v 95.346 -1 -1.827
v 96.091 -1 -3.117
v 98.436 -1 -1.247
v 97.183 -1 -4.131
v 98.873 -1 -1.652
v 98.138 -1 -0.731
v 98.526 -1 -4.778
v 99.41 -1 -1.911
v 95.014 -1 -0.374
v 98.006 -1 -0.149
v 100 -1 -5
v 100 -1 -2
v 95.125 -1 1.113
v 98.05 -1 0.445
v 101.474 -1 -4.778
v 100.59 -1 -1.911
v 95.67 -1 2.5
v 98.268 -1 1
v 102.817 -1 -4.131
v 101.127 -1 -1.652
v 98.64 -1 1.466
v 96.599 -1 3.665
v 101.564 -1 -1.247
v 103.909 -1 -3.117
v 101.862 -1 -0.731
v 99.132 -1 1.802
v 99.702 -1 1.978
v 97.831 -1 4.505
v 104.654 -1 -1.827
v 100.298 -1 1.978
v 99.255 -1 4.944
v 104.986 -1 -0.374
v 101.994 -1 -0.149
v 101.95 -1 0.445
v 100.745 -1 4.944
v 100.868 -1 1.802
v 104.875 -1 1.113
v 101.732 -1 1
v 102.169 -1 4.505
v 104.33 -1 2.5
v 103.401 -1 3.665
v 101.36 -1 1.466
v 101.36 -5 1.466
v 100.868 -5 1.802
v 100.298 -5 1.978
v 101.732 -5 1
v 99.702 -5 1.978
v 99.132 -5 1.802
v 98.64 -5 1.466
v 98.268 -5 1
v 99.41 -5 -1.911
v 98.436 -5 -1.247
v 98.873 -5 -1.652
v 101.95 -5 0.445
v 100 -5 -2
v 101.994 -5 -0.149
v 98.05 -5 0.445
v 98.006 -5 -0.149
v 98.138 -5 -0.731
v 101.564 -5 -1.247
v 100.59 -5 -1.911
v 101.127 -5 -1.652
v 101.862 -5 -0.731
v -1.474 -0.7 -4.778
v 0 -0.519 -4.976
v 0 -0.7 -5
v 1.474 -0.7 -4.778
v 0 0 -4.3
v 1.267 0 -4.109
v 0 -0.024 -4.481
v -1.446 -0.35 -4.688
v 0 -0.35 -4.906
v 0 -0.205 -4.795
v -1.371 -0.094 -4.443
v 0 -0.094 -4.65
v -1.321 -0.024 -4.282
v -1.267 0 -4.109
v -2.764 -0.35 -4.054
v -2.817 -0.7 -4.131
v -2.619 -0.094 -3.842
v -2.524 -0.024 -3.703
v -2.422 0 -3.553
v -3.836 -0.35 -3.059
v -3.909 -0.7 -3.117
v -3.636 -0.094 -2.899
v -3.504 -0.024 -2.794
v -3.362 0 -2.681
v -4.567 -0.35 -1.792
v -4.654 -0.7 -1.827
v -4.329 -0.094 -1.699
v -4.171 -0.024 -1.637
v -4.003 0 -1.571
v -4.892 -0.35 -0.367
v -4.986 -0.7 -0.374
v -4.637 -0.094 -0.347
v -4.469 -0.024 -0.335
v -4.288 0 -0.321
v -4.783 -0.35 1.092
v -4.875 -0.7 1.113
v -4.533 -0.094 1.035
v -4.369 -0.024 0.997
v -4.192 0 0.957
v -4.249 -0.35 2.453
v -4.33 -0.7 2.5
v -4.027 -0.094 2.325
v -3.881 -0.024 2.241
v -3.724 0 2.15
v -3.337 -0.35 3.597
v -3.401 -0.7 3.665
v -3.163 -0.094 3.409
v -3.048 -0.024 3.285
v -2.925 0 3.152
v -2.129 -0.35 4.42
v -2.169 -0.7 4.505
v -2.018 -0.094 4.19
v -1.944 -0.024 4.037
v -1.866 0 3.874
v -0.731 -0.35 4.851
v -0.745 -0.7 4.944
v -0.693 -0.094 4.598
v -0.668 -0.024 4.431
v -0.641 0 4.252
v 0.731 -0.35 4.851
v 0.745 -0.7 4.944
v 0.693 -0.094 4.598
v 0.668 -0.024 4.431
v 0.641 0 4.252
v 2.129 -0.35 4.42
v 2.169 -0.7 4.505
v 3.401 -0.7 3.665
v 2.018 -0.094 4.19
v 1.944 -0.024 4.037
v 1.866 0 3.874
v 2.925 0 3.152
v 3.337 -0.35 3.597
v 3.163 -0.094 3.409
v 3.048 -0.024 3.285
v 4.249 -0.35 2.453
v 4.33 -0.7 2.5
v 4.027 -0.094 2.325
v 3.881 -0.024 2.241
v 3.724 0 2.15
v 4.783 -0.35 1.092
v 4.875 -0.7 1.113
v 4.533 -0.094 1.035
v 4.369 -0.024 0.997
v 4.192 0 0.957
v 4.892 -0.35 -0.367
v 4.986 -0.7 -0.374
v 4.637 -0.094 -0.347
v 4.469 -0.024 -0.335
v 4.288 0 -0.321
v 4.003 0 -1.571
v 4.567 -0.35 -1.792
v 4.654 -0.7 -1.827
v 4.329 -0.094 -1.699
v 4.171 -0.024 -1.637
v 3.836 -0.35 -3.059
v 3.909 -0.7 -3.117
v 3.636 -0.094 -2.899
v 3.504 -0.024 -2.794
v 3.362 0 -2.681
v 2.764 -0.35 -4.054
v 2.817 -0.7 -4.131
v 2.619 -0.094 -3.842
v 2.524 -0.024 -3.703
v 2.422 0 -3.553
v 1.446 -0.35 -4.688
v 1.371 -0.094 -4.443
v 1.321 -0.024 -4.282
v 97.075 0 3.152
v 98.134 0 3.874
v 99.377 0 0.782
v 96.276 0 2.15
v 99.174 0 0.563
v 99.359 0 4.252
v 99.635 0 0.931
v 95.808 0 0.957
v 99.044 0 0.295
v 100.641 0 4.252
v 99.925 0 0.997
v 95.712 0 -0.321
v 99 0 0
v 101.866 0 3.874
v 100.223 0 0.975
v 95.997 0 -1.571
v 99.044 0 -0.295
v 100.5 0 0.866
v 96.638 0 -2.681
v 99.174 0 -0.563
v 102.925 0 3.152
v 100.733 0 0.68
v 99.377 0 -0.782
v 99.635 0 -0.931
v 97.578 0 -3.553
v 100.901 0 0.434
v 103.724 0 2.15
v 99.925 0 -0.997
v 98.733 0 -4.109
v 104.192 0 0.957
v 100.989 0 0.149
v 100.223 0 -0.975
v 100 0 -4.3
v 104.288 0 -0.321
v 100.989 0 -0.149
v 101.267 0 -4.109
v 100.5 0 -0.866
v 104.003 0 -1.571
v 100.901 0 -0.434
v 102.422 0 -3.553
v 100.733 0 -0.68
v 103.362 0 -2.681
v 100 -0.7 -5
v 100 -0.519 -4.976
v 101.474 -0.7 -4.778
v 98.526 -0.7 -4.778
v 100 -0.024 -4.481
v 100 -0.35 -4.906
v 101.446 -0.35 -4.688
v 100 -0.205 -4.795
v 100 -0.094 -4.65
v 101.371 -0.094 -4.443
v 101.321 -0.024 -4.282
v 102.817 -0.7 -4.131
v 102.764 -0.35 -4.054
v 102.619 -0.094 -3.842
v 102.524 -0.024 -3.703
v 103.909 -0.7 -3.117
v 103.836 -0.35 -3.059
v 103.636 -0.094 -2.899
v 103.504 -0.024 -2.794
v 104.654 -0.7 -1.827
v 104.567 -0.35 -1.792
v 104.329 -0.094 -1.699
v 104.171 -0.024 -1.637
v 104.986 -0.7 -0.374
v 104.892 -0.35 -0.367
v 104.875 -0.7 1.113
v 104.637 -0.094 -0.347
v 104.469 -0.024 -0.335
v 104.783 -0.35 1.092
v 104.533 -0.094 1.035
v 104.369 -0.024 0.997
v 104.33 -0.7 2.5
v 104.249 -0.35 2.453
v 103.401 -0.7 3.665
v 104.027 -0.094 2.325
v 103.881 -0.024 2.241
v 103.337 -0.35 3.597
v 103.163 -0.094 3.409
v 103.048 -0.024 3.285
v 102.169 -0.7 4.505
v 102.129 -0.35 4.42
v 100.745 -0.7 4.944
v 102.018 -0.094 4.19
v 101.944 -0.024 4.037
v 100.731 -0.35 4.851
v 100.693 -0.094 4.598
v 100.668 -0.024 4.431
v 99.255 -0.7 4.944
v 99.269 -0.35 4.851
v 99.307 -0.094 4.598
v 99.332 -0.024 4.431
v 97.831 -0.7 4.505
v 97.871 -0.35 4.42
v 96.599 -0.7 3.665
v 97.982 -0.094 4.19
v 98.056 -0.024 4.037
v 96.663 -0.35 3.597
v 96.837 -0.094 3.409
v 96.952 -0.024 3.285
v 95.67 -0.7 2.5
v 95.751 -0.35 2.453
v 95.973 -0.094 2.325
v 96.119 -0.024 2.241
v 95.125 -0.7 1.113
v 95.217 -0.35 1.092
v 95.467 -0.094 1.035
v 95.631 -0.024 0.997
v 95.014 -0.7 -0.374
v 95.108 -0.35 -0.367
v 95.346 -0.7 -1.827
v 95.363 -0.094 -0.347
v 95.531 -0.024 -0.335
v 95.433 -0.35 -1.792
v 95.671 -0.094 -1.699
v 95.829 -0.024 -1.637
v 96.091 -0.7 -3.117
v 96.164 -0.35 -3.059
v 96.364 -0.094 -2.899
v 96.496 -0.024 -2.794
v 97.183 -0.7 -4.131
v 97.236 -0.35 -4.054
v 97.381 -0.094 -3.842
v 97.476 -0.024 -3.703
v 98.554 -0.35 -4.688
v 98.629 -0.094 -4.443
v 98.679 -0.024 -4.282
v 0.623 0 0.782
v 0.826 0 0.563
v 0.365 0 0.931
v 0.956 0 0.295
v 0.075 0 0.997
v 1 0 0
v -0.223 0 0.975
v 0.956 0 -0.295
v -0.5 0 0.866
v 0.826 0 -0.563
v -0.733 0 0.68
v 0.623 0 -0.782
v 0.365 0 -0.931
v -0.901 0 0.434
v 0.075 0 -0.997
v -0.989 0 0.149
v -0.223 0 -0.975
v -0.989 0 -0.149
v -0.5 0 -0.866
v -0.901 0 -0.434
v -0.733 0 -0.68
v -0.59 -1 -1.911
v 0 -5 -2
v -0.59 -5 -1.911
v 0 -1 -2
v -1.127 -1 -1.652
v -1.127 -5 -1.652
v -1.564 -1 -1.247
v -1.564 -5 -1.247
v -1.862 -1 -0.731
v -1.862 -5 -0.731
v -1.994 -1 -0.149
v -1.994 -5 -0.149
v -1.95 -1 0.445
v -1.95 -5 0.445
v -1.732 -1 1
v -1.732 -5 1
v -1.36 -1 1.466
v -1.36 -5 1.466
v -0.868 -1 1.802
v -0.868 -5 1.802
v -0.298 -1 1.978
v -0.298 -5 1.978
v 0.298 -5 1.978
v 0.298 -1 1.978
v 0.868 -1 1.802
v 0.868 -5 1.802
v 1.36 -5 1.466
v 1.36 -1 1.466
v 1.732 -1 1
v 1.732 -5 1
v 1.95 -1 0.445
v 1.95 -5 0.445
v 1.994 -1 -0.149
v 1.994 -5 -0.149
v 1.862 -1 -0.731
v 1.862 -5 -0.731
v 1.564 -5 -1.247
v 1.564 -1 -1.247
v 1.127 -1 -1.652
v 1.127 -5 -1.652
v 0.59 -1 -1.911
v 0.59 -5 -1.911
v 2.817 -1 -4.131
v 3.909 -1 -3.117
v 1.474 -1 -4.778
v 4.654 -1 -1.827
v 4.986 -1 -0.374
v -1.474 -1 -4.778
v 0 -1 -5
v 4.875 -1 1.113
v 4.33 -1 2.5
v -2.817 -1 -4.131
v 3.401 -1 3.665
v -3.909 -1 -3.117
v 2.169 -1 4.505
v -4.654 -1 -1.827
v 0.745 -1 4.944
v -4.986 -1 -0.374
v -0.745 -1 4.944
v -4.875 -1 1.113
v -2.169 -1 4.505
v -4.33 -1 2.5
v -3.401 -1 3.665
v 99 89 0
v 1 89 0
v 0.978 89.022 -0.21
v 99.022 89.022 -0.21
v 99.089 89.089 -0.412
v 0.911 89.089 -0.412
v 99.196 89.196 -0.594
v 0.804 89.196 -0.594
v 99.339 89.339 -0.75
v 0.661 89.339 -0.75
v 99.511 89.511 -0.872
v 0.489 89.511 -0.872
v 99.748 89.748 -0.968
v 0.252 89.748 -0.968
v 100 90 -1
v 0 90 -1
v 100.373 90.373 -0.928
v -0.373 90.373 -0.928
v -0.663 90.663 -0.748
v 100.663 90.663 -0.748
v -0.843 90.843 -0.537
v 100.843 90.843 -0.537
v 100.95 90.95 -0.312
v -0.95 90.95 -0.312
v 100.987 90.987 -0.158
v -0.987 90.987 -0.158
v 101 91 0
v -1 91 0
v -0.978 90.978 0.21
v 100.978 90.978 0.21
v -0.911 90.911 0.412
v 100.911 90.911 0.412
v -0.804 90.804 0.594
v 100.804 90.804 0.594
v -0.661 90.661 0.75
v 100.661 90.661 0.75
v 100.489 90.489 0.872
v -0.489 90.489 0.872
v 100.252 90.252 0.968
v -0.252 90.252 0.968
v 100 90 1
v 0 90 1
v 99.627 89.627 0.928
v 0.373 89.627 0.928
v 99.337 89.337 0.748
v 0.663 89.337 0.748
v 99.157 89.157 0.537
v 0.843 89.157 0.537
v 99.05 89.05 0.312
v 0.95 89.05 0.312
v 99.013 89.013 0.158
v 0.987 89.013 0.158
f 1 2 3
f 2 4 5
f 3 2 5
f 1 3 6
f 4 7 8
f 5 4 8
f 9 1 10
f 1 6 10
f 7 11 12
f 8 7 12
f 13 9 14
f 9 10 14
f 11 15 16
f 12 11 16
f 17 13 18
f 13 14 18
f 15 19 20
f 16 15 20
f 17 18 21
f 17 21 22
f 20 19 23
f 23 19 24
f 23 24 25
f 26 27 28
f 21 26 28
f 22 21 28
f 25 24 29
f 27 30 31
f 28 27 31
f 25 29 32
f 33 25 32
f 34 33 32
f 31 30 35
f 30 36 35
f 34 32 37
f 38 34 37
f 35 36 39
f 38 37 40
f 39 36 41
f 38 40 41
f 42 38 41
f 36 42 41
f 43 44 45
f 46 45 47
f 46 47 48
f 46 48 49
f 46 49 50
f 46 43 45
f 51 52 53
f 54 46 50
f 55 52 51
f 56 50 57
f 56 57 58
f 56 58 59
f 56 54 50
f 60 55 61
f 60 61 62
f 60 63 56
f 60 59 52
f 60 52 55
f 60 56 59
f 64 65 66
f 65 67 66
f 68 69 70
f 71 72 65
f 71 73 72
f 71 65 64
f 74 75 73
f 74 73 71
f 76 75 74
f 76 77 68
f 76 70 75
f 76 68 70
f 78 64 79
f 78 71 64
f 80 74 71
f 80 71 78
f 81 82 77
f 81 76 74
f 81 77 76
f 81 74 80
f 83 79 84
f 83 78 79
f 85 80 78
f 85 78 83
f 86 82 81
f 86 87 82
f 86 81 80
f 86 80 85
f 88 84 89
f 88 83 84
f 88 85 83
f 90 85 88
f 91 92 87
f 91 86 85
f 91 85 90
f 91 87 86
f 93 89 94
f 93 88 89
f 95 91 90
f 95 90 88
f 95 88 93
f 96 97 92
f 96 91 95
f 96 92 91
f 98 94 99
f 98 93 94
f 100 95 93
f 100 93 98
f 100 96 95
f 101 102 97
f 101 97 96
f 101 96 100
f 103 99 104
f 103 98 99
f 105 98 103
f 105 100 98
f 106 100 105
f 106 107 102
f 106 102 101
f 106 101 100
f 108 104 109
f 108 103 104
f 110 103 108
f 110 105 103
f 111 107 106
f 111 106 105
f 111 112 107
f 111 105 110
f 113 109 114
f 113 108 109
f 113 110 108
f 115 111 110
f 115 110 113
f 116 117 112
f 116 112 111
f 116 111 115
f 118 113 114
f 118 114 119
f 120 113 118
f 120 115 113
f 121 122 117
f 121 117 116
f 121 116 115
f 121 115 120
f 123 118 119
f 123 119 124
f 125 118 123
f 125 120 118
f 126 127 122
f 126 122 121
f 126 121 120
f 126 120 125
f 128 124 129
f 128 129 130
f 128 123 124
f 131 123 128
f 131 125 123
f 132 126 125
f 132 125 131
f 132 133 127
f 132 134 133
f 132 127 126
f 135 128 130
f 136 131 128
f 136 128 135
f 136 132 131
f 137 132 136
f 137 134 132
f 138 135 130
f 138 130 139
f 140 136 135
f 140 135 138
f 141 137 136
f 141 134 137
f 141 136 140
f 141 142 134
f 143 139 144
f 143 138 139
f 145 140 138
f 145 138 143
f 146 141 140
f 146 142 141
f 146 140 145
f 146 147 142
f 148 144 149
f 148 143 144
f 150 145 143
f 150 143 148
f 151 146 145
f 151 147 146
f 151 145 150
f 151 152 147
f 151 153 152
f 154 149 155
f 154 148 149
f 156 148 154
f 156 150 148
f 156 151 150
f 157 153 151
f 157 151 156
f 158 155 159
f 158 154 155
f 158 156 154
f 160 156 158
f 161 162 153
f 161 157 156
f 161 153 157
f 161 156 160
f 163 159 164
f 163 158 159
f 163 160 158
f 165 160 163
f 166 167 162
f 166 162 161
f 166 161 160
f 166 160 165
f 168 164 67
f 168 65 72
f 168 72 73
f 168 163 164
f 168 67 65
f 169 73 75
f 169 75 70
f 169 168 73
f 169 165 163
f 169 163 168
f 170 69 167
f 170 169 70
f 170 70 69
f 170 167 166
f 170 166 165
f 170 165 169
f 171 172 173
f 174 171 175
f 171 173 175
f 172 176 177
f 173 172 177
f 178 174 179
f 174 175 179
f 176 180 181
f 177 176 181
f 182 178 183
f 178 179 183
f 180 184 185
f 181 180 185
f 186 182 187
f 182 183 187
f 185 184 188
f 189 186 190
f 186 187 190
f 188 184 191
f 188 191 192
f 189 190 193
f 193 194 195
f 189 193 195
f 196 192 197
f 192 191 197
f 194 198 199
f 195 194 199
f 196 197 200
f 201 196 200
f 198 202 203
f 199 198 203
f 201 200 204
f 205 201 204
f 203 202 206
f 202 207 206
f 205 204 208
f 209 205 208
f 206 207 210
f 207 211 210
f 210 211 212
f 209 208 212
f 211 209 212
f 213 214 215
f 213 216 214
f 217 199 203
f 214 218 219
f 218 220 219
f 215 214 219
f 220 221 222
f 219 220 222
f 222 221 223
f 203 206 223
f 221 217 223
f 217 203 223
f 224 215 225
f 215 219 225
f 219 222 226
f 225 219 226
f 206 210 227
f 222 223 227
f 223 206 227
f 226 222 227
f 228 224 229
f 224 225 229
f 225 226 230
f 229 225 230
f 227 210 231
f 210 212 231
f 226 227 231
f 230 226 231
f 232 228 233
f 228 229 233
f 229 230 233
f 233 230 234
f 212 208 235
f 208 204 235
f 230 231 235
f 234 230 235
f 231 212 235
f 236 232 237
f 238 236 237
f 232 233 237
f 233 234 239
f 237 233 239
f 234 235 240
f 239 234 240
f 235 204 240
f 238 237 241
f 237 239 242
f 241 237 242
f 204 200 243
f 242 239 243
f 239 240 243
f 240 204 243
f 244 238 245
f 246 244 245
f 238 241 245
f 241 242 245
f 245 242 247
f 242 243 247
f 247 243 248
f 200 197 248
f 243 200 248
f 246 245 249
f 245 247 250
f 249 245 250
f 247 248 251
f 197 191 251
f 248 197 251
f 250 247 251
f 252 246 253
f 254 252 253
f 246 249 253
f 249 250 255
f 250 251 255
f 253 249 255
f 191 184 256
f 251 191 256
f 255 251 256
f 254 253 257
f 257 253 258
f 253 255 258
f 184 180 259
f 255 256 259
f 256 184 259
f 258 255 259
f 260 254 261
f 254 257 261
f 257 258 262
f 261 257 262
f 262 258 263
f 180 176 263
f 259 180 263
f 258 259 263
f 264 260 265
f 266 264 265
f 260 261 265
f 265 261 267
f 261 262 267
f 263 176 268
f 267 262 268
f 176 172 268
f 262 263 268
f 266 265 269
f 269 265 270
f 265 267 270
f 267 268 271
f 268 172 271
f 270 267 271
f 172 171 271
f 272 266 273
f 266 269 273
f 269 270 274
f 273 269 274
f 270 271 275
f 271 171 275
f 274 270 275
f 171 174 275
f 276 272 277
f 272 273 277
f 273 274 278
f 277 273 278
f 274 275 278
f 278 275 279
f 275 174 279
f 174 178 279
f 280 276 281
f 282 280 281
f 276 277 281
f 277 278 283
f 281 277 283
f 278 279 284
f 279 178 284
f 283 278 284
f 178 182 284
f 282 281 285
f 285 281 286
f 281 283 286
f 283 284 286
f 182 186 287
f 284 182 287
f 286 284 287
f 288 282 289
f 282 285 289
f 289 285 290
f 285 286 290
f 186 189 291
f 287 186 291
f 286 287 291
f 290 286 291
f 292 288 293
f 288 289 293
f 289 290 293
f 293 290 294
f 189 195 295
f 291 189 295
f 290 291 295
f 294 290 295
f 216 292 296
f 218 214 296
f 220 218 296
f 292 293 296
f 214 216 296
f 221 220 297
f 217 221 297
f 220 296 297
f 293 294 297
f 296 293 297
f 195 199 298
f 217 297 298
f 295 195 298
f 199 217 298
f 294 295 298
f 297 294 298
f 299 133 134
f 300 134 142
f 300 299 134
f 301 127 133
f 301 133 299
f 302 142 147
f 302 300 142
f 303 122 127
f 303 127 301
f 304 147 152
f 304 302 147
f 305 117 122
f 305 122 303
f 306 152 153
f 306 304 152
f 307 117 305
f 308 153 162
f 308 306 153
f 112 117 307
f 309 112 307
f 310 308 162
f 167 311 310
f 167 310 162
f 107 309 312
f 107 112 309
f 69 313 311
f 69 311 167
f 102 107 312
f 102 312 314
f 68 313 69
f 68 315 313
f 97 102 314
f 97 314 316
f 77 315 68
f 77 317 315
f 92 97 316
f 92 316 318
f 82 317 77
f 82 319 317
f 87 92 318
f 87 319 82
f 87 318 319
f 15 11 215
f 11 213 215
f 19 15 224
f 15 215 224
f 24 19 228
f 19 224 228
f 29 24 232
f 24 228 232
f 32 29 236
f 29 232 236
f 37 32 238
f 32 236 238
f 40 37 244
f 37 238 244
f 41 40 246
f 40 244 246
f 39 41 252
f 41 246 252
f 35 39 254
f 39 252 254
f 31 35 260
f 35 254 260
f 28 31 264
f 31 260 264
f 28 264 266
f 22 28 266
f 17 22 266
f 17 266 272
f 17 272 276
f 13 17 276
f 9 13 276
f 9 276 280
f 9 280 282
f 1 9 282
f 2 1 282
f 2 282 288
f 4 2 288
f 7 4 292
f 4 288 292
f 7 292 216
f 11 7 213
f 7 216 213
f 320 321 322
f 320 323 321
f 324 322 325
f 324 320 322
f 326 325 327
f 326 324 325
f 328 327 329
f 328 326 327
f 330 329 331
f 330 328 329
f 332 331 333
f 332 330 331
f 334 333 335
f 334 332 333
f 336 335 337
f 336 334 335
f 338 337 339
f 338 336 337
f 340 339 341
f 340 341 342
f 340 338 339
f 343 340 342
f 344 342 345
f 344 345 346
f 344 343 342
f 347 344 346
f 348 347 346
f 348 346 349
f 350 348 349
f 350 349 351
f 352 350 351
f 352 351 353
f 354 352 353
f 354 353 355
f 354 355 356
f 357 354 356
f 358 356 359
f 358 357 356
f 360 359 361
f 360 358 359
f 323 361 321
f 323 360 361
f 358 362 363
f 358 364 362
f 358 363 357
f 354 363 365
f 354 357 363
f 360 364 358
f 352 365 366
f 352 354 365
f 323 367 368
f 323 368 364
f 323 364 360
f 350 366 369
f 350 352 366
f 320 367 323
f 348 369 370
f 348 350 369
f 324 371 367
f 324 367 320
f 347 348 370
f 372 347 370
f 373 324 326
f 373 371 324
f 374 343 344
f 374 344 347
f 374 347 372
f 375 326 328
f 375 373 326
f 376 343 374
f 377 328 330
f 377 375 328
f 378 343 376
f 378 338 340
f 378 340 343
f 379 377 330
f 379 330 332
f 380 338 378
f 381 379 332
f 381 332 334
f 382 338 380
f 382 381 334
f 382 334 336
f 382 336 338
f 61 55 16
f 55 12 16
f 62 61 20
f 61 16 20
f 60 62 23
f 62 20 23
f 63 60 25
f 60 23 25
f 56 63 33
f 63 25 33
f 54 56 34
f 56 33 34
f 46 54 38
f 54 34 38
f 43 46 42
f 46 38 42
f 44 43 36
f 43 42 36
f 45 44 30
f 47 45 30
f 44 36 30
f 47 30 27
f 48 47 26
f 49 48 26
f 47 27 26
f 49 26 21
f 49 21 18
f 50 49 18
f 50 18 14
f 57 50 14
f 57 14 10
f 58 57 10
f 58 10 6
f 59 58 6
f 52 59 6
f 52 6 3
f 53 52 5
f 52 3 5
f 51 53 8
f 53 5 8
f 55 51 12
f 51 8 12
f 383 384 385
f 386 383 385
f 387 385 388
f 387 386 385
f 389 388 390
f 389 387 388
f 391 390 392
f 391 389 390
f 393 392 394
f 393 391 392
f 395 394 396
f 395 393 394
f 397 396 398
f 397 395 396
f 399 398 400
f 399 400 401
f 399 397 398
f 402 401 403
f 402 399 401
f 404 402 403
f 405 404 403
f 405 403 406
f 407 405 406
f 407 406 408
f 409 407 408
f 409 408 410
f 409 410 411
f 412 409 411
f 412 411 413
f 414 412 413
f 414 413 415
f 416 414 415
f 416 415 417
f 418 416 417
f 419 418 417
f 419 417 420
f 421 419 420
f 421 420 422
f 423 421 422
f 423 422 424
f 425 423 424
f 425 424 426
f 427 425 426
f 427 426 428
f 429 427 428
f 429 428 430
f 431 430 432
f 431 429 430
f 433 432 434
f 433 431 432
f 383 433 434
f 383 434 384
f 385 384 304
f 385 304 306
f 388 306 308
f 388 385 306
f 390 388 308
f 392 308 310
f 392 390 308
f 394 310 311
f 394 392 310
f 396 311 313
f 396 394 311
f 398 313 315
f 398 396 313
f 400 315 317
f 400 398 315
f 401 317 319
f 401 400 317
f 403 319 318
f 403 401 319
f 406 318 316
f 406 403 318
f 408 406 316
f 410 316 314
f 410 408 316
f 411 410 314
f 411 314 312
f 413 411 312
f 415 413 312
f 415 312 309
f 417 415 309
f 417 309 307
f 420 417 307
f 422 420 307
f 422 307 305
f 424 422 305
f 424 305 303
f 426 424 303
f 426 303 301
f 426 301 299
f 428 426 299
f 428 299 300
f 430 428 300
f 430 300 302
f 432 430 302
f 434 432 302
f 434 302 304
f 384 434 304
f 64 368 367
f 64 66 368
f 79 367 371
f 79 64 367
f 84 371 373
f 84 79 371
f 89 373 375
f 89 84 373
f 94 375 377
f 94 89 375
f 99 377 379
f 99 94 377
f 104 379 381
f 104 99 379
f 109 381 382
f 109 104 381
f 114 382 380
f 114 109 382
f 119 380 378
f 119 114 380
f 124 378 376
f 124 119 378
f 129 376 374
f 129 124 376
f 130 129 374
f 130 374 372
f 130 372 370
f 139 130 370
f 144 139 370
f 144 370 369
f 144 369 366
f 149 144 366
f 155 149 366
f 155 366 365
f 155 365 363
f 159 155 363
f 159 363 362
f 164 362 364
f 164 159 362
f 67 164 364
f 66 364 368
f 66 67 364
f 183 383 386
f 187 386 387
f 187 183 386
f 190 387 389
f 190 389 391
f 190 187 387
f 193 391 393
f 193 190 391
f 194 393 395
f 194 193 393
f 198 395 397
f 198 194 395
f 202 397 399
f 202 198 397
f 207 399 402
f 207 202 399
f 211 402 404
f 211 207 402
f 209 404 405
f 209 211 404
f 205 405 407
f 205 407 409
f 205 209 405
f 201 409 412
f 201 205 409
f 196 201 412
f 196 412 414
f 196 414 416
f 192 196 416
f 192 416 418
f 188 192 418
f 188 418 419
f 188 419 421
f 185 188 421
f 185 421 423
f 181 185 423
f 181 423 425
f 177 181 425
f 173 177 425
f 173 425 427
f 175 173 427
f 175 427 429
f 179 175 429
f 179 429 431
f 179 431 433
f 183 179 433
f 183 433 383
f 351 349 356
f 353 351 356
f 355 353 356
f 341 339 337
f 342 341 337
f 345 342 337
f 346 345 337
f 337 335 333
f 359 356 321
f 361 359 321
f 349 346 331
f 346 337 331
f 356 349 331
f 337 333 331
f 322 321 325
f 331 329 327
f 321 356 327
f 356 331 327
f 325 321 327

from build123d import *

# Parameters (mm, degrees)
SKETCH5_R = 1
SKETCH4_W = 4
SKETCH4_H = 2


with BuildPart() as part:
    # Sweep1: sweep along a path in Sketch3
    with BuildLine(Plane.XY) as sweep1_path:
        Line((0, 0), (0, 90))
        Line((0, 90), (100, 90))
        Line((100, 90), (100, 0))
    # Sketch5 → Sweep1 (sweep)
    with BuildSketch(Plane(origin=(0, 0, 0), x_dir=(1, 0, 0), z_dir=(0, 1, 0))):
        Circle(SKETCH5_R)
    sweep(path=sweep1_path.line, transition=Transition.RIGHT)

    # Sketch4 → Revolve1 (revolve)
    with BuildSketch(Plane.YZ):
        with BuildLine():
            Line((0, -4.3), (0, 0))
            Line((0, 0), (-1, 0))
            Line((-1, 0), (-1, -2))
            Line((-1, -2), (-1, -5))
            Line((-1, -5), (-0.7, -5))
            ThreePointArc((-0.7, -5), (-0.205025253, -4.794974747), (0, -4.3))
        make_face()
        with Locations((-3, -1)):
            Rectangle(SKETCH4_W, SKETCH4_H)
    revolve1 = revolve(axis=Axis((0, 0, 0), (0, 1, 0)))

    # Mirror1: Revolve1 across plane
    add(revolve1.mirror(Plane(origin=(50, 0, 0), x_dir=(0, 0, 1), z_dir=(1, 0, 0))))


solid = part.part
